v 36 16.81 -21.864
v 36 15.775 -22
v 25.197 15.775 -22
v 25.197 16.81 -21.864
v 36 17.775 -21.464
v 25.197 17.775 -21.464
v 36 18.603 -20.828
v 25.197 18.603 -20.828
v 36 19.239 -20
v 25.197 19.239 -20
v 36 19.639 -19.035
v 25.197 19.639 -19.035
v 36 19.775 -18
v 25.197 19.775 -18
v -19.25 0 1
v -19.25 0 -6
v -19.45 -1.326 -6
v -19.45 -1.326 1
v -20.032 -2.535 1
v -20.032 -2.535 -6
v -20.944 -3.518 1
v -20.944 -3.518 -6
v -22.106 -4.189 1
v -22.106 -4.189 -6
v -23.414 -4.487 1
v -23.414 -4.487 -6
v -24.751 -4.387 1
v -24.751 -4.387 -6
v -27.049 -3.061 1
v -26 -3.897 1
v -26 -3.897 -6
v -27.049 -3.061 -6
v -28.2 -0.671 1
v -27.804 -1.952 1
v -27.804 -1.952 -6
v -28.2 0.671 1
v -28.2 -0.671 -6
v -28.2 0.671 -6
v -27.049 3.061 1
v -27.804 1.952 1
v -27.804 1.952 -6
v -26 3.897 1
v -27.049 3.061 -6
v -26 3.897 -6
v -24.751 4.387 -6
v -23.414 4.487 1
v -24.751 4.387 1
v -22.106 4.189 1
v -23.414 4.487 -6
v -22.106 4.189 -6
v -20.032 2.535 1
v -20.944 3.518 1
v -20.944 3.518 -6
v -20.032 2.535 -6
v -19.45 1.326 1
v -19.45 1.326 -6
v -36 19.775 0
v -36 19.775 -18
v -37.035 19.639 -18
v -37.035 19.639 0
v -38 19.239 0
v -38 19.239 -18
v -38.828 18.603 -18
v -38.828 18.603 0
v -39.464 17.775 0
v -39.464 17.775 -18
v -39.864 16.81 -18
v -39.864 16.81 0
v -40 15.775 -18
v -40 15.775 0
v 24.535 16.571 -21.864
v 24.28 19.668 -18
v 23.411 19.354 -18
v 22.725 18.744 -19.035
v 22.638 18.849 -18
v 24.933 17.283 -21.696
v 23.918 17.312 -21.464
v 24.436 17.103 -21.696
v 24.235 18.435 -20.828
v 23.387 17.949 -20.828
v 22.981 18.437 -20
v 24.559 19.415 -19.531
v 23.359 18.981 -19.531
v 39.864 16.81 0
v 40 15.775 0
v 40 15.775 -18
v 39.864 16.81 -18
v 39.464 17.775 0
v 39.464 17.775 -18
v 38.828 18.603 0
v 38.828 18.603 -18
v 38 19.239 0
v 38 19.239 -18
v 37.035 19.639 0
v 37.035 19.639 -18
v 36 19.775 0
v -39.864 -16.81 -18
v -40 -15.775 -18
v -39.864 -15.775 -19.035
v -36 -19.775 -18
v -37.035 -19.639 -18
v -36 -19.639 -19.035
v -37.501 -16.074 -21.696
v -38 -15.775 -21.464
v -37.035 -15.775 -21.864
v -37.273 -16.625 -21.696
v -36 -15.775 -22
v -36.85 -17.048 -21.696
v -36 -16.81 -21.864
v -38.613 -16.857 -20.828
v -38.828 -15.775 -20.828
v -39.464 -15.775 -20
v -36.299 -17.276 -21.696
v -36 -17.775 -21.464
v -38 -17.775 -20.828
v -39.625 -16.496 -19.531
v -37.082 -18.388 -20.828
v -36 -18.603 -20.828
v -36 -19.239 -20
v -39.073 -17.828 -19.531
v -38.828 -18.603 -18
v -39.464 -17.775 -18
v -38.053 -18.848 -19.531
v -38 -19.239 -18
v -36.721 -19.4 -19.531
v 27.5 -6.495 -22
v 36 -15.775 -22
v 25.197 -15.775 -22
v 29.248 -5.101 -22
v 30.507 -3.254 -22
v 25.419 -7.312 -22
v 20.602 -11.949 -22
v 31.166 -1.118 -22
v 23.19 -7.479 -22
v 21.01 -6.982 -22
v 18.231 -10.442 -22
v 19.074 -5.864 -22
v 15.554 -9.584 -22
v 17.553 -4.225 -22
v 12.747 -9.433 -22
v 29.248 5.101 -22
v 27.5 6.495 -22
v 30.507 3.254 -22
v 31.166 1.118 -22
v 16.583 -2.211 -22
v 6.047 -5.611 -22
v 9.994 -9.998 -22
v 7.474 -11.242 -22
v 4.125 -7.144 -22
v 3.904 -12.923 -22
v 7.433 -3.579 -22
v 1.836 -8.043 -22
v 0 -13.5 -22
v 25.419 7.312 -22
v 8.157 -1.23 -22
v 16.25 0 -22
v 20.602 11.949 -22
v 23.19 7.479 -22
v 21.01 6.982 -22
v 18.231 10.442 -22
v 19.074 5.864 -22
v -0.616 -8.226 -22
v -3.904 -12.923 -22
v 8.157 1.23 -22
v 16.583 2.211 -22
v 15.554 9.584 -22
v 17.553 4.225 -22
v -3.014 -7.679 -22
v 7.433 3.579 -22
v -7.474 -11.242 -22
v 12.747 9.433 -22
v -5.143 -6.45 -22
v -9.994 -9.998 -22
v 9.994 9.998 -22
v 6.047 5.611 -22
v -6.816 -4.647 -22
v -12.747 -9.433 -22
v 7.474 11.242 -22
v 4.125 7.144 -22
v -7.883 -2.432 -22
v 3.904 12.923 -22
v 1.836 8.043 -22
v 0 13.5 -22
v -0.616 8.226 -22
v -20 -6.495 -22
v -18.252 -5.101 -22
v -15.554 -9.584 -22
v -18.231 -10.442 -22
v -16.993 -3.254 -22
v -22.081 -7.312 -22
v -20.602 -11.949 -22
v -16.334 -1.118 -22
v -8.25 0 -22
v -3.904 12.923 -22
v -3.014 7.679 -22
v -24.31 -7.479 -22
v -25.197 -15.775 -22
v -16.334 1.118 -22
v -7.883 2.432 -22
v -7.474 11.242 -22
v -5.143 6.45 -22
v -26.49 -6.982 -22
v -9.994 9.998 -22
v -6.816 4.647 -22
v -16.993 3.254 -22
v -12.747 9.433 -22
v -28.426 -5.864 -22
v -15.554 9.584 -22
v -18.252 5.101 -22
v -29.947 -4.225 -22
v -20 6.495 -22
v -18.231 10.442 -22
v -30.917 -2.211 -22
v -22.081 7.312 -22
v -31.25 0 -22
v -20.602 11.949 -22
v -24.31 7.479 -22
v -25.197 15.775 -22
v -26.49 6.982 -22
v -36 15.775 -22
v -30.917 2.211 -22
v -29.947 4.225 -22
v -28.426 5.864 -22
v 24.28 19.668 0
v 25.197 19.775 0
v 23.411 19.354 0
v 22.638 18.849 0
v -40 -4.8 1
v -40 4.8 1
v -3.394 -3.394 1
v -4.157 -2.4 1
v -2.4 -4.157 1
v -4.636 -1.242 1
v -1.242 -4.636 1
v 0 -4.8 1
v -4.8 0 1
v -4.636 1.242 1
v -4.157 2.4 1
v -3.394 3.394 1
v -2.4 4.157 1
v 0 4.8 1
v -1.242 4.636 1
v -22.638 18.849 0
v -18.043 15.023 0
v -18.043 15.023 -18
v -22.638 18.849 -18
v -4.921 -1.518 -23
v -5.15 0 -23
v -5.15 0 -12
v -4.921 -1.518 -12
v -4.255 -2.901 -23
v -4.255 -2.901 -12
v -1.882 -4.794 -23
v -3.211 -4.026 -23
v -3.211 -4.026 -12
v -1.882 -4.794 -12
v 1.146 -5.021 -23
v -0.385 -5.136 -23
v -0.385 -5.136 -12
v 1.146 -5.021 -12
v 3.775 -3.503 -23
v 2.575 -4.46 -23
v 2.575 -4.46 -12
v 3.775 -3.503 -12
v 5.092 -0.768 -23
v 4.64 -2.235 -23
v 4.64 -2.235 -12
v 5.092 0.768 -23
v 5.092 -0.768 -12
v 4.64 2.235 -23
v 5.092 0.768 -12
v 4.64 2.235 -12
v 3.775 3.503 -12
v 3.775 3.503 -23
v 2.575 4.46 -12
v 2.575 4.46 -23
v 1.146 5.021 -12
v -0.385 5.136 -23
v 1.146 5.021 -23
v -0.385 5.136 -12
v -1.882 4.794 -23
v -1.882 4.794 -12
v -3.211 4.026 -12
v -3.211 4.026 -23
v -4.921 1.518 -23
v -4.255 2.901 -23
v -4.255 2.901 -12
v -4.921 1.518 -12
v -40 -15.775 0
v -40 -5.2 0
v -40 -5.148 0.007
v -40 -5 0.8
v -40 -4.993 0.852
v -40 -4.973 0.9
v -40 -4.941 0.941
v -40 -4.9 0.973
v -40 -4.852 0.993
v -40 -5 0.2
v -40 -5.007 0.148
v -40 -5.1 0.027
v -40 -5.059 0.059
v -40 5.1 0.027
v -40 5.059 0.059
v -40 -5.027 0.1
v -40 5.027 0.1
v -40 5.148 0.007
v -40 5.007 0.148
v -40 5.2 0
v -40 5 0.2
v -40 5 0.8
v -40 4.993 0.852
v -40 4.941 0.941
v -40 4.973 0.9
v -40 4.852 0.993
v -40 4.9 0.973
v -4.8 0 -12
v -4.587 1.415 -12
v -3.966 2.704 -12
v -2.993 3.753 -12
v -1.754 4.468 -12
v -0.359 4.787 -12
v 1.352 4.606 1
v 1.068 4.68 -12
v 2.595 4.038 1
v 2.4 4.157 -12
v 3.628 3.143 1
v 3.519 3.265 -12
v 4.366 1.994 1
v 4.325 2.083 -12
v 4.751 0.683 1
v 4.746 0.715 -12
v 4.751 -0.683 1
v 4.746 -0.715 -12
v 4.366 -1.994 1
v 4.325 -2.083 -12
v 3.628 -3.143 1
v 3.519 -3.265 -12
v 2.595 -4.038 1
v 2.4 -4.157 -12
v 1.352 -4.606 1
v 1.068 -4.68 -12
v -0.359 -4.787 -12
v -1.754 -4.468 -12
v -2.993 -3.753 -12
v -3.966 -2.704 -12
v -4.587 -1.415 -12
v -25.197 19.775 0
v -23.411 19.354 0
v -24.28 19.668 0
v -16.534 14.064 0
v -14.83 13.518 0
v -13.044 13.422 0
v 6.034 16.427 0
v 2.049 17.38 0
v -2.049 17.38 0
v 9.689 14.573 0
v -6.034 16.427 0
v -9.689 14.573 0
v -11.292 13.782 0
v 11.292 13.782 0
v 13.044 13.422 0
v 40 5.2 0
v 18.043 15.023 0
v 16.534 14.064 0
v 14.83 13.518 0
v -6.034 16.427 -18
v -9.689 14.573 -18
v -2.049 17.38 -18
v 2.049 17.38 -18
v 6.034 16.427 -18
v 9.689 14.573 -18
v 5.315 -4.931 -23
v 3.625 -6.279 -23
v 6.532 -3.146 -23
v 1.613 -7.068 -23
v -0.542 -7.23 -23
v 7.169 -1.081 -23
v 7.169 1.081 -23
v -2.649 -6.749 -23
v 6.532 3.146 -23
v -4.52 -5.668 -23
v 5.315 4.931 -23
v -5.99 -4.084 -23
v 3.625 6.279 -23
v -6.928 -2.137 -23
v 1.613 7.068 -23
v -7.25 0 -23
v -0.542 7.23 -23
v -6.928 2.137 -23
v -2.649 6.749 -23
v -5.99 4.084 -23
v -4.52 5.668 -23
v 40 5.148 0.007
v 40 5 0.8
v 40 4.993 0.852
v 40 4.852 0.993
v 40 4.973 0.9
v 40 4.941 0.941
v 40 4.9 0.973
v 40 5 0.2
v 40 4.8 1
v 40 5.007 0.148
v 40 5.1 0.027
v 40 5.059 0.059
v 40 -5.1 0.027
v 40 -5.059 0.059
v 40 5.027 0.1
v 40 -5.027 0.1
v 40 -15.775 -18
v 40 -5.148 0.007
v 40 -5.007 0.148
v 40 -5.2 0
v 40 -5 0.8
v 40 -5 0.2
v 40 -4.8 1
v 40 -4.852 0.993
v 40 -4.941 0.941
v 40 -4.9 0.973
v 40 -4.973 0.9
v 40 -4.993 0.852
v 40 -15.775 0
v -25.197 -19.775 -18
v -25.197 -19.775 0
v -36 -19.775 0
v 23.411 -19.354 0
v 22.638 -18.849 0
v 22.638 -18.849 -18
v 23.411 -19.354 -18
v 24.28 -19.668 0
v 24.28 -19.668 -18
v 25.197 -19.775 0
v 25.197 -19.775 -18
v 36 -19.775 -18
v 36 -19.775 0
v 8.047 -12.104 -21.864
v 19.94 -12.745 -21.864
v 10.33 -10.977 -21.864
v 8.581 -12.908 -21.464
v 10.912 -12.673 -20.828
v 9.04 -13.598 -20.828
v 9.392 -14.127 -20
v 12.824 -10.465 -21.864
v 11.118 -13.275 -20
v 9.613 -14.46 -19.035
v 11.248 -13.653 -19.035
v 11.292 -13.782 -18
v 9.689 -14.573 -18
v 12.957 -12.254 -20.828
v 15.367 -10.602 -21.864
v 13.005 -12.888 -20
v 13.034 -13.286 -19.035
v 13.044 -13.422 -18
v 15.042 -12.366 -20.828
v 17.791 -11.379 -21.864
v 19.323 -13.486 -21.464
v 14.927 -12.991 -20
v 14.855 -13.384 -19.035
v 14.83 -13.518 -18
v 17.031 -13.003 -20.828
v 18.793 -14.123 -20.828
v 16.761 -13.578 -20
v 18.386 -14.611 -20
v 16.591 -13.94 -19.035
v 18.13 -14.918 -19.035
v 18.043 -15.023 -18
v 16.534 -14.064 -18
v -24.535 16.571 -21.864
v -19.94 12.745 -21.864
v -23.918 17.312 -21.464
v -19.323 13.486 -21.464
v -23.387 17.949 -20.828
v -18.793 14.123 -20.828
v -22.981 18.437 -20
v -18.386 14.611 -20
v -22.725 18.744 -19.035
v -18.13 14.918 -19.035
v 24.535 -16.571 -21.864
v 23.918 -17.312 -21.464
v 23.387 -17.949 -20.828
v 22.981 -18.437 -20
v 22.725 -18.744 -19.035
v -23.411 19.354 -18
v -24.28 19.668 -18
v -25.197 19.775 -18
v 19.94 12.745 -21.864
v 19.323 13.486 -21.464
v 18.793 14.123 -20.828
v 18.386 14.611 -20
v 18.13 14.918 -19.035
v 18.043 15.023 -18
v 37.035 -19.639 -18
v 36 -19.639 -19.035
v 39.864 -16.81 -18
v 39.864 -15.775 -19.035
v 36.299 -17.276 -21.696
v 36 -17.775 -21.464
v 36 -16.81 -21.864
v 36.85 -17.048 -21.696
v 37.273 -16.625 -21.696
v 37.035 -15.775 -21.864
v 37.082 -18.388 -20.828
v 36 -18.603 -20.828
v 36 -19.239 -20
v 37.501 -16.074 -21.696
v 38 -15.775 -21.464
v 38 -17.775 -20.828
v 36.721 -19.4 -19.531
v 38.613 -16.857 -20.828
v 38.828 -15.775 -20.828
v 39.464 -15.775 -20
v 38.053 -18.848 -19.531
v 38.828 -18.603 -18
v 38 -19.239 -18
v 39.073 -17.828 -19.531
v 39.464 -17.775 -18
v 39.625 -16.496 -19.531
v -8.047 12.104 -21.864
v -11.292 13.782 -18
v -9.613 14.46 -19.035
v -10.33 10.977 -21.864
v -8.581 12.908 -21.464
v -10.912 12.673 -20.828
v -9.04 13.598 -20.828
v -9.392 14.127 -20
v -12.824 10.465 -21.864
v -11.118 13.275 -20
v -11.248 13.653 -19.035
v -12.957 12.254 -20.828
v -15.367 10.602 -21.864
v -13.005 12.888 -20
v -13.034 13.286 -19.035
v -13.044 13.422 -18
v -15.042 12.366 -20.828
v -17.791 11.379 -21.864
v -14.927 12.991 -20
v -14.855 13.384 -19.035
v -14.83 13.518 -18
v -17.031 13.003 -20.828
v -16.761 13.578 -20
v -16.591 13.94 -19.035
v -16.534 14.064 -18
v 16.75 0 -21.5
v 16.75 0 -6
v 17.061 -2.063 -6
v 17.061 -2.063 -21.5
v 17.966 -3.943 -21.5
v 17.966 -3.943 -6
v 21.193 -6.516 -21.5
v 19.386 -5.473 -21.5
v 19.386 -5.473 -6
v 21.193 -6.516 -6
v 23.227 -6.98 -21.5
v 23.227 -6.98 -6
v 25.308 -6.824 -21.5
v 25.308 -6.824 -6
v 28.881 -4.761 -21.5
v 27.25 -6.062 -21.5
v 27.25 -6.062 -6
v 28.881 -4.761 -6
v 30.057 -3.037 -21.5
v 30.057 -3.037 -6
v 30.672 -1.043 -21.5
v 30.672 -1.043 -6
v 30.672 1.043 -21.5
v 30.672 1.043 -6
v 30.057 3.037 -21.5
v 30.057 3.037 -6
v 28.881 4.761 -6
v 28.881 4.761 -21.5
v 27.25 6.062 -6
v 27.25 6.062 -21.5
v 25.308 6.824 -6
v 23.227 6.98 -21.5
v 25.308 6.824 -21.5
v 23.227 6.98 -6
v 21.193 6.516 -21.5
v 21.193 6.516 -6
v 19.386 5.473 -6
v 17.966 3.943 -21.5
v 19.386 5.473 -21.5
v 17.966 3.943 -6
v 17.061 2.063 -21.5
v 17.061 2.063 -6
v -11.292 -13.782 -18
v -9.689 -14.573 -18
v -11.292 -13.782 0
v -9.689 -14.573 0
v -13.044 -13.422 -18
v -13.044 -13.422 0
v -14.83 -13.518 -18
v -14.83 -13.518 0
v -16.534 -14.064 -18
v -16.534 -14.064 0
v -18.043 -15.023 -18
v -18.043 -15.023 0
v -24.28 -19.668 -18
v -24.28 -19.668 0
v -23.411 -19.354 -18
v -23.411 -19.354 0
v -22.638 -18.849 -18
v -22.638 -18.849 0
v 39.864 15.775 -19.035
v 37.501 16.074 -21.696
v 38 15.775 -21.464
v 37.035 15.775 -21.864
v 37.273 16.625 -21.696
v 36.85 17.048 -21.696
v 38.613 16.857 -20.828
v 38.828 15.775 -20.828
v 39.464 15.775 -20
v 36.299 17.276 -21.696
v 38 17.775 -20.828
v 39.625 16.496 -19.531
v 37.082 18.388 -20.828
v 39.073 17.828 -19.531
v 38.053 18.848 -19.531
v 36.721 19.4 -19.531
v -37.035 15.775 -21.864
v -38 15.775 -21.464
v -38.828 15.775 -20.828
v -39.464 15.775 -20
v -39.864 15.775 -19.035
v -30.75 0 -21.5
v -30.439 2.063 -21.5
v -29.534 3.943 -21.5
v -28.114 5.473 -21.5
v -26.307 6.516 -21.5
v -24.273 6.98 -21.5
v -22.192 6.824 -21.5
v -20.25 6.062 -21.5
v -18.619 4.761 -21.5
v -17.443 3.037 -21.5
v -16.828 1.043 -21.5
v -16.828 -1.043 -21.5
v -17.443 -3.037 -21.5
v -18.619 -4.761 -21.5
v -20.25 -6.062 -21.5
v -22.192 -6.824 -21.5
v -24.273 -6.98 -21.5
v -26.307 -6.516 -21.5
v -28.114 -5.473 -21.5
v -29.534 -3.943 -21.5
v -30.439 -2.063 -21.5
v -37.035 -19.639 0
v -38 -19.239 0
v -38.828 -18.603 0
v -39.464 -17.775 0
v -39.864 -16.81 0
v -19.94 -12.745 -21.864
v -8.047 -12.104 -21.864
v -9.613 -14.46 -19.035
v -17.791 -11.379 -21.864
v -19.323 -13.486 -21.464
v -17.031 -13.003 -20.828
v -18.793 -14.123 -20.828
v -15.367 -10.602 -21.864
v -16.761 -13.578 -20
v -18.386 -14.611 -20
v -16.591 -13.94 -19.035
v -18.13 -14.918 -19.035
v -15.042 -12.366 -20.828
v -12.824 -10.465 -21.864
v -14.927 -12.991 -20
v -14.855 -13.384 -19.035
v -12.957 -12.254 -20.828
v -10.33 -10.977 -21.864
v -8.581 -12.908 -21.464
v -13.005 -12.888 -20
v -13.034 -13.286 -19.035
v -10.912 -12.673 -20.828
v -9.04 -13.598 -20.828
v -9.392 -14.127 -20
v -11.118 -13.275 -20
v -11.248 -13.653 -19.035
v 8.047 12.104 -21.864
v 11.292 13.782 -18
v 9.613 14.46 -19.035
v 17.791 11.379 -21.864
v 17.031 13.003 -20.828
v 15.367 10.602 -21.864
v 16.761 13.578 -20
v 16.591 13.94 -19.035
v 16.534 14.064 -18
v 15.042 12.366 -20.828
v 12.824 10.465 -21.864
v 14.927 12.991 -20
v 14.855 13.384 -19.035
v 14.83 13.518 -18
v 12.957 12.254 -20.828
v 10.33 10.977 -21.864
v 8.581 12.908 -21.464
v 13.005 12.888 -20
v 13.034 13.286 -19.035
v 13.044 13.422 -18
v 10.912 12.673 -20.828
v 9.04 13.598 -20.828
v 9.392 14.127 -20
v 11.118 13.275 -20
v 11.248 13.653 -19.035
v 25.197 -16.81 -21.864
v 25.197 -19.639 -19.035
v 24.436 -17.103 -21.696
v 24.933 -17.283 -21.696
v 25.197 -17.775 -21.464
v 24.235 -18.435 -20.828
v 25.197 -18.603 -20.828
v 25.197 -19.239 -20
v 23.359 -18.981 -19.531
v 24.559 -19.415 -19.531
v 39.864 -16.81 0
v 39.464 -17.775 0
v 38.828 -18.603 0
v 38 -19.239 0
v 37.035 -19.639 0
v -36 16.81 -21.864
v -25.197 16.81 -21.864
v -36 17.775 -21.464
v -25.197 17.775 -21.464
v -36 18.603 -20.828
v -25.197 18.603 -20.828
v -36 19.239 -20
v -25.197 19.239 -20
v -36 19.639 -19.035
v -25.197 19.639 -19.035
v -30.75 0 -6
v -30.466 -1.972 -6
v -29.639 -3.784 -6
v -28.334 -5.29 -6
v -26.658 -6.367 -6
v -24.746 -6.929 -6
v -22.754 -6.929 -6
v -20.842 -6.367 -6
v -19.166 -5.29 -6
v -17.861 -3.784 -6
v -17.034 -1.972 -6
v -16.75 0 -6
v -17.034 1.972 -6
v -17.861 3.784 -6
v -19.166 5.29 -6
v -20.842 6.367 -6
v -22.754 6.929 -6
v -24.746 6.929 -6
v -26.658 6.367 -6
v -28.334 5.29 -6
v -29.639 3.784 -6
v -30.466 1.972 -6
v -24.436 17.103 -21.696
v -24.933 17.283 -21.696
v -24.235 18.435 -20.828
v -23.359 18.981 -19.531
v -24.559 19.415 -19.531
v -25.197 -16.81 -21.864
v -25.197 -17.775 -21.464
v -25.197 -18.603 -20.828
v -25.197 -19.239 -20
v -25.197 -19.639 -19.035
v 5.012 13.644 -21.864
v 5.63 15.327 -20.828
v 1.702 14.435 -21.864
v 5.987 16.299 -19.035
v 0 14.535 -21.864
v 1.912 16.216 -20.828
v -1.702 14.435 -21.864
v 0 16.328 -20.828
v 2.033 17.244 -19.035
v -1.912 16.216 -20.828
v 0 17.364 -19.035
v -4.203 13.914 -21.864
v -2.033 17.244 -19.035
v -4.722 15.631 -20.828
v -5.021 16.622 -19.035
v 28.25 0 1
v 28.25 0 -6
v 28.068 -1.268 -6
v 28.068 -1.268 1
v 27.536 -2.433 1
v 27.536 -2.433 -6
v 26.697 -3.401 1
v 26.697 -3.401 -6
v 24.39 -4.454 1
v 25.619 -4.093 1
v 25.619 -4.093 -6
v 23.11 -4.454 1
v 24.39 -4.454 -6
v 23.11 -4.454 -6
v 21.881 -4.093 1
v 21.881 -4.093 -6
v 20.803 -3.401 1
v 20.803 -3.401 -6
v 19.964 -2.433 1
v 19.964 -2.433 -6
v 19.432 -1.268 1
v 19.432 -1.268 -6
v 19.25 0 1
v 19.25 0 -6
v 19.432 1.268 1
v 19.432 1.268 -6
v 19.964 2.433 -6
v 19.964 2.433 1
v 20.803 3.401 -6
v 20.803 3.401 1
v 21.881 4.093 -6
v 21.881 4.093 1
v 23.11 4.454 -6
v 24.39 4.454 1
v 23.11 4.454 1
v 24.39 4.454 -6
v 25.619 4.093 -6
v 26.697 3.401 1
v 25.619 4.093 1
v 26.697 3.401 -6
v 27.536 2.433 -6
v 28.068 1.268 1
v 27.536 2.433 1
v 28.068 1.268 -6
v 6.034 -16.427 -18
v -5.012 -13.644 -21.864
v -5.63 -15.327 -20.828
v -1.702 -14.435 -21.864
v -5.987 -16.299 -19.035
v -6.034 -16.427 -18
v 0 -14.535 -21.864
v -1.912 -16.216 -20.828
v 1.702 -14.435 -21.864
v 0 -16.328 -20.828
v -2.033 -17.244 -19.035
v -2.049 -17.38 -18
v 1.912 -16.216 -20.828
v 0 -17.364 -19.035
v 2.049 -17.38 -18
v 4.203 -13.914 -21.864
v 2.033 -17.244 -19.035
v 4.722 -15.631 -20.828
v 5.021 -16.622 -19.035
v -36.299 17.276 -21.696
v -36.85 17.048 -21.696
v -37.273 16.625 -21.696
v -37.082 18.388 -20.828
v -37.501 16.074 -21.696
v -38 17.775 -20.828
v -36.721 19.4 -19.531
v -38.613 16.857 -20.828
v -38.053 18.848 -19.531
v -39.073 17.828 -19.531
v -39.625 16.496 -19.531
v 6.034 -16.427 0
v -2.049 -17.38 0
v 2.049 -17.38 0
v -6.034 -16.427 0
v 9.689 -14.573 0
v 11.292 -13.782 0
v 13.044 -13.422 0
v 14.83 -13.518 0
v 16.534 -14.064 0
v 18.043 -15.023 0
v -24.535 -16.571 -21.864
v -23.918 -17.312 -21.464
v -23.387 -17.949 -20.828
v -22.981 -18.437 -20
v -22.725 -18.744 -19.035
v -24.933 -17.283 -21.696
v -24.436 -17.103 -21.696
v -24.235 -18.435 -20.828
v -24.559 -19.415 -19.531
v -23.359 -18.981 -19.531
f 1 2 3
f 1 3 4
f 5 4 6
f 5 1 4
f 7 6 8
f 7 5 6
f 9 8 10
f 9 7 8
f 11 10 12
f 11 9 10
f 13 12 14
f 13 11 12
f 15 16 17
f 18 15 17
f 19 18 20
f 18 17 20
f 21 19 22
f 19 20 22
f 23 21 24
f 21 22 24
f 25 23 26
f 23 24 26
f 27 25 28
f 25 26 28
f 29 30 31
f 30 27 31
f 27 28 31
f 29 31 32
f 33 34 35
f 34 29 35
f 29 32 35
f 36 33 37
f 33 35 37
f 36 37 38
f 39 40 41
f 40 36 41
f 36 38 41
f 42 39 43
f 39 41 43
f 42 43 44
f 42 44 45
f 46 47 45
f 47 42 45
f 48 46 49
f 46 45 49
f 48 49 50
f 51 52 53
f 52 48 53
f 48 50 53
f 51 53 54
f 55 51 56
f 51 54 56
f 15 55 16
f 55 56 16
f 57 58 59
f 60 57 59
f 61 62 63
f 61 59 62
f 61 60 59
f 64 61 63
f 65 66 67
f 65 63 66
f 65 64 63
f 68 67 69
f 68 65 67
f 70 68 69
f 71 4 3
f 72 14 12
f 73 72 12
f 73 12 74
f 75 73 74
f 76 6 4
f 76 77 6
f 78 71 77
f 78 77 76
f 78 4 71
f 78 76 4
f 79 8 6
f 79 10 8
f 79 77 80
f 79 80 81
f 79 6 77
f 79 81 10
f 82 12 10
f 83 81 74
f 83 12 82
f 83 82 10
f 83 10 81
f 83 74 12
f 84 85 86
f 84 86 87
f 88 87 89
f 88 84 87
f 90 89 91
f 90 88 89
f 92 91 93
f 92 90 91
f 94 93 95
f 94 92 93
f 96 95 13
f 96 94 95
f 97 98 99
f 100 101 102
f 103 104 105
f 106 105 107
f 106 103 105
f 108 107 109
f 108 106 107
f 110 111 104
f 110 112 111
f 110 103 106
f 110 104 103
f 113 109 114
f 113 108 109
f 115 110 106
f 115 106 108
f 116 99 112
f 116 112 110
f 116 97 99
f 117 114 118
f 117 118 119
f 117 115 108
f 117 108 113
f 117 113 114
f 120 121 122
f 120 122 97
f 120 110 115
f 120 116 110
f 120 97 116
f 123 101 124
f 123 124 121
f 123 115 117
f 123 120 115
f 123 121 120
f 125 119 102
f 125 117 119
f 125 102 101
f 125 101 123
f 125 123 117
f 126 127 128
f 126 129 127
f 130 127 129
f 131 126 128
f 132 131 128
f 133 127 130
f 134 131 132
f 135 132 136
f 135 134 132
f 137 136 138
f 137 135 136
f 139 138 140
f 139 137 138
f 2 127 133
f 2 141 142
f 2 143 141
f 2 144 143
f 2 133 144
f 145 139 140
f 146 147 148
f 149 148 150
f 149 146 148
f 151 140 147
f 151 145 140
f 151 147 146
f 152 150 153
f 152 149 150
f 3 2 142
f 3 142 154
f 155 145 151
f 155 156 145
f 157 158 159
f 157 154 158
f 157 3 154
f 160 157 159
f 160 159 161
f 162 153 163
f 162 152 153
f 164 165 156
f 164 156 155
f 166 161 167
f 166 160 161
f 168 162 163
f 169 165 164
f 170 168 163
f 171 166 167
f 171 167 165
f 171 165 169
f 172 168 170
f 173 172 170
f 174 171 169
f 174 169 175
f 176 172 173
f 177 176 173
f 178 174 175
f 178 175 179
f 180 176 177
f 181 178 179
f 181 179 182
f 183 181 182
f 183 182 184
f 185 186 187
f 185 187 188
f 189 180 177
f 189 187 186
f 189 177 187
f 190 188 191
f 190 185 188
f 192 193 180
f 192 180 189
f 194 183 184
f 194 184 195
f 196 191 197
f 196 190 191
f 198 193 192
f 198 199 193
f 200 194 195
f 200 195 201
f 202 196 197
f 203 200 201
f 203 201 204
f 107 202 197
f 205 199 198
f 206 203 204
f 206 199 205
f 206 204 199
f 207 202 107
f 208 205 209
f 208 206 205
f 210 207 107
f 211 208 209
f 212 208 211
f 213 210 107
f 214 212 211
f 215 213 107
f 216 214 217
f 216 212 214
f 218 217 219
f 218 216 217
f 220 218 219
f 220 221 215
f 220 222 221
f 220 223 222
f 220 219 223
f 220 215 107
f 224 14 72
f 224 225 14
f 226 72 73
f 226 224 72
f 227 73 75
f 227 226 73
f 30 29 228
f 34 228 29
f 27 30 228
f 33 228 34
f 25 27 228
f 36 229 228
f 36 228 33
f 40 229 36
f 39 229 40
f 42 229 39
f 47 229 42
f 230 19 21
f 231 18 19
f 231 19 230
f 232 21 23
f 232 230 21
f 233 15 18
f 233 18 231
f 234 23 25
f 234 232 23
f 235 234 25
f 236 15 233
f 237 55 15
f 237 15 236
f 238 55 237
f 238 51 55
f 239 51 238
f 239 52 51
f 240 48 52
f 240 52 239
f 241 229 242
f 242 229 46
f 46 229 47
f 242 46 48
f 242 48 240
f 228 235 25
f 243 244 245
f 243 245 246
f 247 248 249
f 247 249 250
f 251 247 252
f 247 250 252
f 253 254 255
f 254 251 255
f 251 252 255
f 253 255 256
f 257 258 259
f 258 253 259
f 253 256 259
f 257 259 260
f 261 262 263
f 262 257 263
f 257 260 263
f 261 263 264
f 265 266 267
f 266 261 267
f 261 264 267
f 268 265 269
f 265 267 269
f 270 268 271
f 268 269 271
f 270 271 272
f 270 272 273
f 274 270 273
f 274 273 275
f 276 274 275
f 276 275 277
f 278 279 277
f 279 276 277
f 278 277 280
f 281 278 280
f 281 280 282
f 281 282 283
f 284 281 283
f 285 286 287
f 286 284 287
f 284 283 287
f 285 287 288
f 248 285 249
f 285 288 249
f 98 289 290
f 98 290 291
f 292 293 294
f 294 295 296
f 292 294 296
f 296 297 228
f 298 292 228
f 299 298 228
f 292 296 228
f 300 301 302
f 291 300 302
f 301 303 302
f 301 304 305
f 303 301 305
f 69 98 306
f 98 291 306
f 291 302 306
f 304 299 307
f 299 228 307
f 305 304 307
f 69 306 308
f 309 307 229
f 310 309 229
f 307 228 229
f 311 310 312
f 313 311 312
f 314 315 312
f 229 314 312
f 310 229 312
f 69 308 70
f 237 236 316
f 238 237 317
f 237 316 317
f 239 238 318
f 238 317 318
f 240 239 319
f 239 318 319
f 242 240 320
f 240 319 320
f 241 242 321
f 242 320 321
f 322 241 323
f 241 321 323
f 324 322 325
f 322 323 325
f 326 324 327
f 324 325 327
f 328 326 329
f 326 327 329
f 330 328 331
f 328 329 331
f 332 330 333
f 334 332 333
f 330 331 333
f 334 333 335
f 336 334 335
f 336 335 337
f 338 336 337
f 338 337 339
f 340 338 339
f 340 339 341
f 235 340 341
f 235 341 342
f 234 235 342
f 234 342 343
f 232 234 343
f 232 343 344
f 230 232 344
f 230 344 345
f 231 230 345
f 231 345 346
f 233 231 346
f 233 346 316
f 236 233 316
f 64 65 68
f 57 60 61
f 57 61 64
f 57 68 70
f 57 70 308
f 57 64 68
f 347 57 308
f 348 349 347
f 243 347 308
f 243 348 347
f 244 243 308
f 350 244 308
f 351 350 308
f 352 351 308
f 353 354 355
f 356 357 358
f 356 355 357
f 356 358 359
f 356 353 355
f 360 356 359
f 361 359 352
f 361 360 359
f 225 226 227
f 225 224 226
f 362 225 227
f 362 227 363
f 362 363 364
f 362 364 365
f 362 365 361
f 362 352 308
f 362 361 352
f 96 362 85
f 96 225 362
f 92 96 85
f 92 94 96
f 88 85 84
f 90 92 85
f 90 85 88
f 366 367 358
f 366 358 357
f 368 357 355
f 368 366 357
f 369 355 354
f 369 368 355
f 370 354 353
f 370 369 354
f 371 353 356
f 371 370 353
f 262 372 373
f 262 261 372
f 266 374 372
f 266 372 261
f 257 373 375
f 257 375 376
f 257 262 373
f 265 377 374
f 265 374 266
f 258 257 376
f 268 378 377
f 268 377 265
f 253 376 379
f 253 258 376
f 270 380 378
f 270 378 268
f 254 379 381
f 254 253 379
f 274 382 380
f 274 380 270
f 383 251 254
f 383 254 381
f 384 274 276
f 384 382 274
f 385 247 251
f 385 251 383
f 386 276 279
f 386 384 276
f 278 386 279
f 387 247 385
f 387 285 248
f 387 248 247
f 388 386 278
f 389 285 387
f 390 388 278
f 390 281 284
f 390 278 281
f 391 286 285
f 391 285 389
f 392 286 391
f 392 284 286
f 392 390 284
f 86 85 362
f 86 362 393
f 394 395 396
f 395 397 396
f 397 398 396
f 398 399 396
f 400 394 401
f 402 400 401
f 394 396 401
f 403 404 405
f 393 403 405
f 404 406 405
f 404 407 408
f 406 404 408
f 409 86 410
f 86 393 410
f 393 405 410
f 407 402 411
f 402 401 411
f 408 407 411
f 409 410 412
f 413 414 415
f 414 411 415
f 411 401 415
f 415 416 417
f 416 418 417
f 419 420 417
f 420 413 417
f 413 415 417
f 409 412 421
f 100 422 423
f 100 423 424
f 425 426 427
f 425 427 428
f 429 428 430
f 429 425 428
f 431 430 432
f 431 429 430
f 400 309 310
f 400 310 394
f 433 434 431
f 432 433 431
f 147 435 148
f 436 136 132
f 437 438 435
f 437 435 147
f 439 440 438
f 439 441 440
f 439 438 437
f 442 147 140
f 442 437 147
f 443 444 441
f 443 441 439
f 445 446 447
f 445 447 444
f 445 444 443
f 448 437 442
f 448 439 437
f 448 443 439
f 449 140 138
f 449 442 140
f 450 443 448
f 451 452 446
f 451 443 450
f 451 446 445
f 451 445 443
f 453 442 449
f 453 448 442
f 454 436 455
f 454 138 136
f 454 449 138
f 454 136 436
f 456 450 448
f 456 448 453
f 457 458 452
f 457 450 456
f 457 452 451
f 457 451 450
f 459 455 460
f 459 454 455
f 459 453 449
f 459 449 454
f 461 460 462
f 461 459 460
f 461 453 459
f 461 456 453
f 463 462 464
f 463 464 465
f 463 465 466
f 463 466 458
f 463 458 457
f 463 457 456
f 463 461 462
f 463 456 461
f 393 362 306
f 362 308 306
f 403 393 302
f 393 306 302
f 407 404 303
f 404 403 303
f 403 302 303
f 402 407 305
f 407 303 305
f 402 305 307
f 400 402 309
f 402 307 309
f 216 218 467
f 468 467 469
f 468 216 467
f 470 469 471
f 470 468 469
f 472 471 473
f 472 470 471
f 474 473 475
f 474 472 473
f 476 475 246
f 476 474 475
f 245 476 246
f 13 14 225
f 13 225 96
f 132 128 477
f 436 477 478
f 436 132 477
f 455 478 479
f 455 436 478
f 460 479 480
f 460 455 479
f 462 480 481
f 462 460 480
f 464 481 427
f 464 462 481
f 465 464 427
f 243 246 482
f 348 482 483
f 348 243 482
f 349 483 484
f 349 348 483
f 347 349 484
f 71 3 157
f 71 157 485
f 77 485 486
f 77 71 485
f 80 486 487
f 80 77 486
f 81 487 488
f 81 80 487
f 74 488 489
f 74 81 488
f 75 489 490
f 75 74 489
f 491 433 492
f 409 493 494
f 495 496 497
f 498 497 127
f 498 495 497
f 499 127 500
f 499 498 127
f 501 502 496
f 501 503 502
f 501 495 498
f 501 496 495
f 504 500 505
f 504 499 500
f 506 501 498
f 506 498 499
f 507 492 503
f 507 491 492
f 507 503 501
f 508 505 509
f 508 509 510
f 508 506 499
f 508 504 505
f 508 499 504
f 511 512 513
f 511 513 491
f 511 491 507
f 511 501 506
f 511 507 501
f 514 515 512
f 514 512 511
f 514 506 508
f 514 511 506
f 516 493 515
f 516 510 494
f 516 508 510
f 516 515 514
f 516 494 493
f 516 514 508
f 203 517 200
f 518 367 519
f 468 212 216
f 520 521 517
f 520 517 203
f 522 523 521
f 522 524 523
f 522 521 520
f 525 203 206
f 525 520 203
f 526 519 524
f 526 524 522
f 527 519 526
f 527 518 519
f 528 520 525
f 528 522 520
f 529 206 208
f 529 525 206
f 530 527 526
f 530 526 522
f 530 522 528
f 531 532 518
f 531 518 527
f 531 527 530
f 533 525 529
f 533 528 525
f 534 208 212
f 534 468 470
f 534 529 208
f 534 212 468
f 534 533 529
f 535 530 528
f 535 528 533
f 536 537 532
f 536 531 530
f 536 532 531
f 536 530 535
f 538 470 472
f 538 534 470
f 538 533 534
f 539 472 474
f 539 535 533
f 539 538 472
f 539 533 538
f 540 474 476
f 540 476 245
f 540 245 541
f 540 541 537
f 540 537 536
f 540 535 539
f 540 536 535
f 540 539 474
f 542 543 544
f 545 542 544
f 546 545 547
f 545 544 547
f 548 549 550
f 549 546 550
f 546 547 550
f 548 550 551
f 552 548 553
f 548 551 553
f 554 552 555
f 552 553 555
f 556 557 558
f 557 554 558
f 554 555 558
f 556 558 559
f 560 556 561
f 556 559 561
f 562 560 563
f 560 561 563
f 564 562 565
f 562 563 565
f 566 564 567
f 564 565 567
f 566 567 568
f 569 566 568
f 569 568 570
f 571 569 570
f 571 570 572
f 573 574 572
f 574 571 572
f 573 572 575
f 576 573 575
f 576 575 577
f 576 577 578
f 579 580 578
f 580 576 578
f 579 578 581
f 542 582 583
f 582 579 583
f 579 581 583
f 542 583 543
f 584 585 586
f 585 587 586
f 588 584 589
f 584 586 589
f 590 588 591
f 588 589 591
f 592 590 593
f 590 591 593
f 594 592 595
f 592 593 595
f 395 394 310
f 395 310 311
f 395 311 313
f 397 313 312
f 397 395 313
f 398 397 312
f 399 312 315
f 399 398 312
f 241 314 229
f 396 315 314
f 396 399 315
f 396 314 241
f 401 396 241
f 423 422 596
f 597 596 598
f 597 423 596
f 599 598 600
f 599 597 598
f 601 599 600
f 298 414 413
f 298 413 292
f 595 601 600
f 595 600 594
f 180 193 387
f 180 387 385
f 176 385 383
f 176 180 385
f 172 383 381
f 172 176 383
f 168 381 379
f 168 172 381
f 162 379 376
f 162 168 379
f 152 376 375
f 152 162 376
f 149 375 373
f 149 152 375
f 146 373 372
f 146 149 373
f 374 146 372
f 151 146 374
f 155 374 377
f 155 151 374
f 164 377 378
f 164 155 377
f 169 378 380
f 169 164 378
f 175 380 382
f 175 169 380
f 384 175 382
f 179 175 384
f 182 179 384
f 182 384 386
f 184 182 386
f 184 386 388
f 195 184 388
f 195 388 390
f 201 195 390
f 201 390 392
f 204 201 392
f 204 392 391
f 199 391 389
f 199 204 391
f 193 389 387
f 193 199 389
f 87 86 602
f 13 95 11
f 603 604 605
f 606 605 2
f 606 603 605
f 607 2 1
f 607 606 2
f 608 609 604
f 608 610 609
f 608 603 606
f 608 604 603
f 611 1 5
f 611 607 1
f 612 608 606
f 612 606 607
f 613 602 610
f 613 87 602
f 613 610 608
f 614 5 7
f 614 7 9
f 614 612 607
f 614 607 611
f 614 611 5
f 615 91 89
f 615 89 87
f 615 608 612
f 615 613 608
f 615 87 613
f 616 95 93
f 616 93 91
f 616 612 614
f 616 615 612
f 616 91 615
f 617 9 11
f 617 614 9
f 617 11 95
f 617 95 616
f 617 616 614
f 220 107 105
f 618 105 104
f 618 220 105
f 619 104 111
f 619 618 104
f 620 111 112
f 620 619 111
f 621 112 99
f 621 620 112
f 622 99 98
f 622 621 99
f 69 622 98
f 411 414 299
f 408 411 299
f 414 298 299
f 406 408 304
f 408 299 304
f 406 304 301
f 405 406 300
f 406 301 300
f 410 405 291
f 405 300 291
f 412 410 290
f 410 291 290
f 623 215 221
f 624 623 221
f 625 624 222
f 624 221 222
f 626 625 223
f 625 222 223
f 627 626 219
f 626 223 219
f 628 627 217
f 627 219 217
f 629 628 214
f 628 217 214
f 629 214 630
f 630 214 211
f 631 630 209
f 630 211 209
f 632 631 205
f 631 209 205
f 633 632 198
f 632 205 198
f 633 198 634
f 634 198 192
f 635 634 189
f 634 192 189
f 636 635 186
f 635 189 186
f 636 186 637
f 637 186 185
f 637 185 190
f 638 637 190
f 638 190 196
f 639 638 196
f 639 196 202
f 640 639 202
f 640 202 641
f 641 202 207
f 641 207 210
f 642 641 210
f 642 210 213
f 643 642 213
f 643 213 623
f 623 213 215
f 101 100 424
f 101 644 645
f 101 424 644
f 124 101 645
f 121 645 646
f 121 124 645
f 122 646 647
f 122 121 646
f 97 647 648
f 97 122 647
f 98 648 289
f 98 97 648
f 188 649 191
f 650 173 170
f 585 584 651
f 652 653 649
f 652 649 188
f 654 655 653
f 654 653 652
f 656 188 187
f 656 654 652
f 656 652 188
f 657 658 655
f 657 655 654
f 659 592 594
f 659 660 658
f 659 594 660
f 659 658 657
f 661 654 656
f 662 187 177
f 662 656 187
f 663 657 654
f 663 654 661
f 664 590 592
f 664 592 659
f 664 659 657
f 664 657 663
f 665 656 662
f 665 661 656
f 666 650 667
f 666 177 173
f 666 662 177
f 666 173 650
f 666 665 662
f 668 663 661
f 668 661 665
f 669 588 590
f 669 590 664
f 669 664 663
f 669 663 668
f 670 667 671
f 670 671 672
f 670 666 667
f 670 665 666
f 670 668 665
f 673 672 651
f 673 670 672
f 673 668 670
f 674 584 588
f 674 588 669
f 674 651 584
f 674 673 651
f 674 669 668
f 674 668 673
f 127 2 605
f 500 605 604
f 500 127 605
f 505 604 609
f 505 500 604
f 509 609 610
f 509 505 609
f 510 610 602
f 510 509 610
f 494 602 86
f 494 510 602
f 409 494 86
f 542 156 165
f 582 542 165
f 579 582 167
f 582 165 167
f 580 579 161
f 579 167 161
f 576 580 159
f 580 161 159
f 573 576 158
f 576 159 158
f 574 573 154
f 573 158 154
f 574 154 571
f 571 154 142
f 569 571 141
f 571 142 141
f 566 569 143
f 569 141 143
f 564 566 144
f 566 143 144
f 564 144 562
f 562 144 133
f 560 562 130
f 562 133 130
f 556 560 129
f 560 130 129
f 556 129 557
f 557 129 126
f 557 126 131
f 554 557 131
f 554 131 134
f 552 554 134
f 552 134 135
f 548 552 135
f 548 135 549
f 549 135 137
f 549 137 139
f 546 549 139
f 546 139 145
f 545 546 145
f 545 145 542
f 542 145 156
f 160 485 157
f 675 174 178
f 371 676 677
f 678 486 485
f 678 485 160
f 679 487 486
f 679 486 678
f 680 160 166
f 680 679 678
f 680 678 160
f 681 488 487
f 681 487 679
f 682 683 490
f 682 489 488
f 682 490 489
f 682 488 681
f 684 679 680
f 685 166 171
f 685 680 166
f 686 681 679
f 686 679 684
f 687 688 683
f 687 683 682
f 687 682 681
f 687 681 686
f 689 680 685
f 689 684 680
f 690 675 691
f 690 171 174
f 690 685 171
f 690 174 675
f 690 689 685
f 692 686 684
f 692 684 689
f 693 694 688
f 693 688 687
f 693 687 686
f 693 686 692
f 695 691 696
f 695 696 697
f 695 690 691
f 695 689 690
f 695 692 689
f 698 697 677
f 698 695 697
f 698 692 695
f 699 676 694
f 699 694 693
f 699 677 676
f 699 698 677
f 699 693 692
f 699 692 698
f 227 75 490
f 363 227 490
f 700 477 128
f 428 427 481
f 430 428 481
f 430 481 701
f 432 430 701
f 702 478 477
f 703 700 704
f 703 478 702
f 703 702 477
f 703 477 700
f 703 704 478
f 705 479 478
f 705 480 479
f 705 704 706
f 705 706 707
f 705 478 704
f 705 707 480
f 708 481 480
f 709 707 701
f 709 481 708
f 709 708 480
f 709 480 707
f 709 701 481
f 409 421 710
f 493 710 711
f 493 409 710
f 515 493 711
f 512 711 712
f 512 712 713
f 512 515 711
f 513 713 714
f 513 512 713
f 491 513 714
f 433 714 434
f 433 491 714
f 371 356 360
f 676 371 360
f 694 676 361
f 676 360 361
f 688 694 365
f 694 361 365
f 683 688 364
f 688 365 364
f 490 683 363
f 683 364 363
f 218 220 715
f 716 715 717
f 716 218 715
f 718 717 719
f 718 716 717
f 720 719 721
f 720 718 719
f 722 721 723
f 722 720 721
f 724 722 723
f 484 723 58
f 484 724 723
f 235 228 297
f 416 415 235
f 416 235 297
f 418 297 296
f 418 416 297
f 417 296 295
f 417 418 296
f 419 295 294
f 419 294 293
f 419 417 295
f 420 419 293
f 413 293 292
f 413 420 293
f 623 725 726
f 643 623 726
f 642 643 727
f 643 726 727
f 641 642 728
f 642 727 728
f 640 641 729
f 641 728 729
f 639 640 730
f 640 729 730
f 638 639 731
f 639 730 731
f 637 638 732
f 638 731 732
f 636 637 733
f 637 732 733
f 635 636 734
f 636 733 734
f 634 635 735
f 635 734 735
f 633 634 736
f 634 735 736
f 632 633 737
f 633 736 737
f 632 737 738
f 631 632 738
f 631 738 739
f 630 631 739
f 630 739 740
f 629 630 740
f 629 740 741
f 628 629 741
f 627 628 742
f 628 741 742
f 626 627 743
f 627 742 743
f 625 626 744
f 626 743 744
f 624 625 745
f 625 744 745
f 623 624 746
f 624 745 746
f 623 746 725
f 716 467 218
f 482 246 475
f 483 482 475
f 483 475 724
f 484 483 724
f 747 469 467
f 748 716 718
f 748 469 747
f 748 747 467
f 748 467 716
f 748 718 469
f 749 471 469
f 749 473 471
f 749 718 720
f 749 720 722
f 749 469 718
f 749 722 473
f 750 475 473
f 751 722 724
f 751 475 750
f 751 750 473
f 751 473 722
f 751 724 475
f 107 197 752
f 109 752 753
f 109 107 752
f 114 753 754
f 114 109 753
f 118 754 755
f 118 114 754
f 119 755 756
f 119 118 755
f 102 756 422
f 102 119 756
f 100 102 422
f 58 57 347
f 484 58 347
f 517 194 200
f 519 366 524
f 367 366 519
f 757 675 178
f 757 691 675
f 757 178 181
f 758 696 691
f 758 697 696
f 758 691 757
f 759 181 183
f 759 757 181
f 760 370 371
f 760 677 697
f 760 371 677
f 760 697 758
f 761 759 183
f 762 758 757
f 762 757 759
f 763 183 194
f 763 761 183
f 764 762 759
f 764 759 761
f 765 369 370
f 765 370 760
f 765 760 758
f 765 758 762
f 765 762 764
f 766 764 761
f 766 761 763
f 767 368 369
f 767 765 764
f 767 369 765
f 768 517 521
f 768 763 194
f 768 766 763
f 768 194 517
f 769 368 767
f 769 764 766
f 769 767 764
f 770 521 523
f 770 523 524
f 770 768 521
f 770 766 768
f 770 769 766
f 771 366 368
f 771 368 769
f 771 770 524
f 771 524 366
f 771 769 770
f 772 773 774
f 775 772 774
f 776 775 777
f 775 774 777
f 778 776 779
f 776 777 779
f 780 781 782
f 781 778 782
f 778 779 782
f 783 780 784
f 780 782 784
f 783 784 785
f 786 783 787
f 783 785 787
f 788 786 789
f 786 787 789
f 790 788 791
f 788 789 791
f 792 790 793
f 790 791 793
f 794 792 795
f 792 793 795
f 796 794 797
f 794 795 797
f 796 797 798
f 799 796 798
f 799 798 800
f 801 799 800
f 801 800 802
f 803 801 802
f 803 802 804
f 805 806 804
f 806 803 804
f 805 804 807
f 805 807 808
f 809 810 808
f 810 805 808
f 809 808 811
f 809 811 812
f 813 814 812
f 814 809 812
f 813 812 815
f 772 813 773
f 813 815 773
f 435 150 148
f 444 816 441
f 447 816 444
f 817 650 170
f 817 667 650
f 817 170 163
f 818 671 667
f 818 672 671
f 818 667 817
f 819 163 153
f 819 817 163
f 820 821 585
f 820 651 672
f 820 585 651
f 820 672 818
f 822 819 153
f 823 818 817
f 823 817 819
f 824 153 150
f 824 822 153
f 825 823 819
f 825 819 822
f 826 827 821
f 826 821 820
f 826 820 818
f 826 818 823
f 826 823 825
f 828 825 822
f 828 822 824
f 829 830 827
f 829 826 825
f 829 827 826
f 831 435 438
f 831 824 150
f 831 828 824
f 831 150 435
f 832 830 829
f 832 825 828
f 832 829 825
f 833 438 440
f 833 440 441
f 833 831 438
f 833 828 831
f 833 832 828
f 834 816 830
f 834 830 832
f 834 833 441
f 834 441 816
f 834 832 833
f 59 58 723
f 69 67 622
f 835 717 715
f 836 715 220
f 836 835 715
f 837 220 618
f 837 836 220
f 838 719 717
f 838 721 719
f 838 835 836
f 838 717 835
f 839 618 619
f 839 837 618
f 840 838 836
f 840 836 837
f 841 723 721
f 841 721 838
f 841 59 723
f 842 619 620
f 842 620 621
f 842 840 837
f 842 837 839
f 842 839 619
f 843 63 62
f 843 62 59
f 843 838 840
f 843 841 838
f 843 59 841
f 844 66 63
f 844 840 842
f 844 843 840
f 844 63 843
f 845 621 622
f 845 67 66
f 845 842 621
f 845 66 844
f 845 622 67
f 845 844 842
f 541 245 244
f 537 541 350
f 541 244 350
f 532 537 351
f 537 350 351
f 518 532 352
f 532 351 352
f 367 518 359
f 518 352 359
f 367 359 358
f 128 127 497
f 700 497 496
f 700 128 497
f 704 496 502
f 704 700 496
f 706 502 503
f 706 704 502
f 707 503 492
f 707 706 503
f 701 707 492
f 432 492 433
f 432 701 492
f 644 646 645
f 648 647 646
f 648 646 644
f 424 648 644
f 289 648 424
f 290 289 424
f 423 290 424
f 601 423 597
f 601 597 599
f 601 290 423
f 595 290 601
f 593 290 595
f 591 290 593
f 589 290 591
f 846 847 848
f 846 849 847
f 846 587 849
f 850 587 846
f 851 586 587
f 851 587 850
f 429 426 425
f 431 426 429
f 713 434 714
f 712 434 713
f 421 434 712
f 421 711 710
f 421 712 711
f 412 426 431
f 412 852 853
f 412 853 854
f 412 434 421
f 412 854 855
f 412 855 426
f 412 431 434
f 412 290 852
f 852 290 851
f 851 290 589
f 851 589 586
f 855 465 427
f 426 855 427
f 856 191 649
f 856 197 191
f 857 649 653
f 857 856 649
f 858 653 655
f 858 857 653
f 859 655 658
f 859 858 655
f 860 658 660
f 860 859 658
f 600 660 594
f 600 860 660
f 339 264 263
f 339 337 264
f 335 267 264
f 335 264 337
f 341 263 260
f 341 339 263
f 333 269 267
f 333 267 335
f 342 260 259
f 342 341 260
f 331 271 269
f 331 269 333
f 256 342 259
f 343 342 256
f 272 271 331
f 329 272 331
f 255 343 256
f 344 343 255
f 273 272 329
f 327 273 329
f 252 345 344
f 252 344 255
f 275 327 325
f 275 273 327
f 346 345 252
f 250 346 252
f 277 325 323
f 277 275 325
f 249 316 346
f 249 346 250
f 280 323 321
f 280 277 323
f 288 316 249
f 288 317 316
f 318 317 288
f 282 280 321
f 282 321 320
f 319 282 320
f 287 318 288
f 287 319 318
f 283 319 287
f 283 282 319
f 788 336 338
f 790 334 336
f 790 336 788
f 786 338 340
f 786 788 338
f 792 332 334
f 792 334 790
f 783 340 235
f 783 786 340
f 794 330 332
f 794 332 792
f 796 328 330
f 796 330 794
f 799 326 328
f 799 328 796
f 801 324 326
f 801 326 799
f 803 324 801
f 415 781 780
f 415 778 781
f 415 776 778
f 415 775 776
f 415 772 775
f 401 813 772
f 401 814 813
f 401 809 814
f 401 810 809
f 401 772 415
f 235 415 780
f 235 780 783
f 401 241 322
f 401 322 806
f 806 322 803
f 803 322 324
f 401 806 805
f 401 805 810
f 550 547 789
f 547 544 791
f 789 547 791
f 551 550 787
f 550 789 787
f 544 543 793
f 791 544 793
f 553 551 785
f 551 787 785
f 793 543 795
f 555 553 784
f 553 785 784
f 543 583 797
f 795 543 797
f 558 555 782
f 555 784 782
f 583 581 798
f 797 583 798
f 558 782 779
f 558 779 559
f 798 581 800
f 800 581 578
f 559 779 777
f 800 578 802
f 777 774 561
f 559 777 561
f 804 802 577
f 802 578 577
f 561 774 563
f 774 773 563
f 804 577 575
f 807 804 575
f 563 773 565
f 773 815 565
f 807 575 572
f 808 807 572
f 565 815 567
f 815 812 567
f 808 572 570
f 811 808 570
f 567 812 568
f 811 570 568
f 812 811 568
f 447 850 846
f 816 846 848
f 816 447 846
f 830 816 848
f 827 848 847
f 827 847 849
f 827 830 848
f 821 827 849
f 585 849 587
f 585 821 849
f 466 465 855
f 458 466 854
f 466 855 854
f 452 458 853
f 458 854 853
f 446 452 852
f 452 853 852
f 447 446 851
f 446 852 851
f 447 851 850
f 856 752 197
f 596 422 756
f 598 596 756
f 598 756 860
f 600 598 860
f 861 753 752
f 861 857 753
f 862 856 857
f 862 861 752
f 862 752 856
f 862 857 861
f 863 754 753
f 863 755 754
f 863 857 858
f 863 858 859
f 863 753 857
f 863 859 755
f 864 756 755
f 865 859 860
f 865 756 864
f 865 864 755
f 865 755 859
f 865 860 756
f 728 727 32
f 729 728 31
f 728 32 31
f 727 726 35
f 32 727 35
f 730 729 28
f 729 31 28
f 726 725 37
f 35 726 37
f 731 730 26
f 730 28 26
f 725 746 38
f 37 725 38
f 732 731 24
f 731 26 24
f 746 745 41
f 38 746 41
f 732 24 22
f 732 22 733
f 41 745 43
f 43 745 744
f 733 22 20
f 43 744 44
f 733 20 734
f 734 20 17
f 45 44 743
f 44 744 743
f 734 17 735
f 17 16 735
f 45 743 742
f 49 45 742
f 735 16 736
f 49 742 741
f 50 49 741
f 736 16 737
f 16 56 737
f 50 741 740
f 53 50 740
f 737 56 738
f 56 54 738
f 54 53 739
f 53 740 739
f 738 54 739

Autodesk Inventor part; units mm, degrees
ref_plane "YZ Plane" through (0, 0, 0) normal (1, 0, 0) x (0, 1, 0)
ref_plane "XZ Plane" through (0, 0, 0) normal (0, 1, 0) x (-1, 0, 0)
ref_plane "XY Plane" through (0, 0, 0) normal (0, 0, 1) x (1, 0, 0)
sketch "Sketch1" plane through (0, 0, 0) normal (0, 0, 1) x (1, 0, 0)
  line L0 (-40, 19.775) -> (40, 19.775)
  line L1 (40, 19.775) -> (40, -19.775)
  line L2 (40, -19.775) -> (-40, -19.775)
  line L3 (-40, -19.775) -> (-40, 19.775)
  line L4 (-40, 19.775) -> (40, -19.775) construction
  line L5 (40, 19.775) -> (-40, -19.775) construction
  line L6 (40, -5) -> (-40, -5)
  line L7 (-40, -5) -> (-40, 5)
  line L8 (-40, 5) -> (40, 5)
  line L9 (40, 5) -> (40, -5)
  line L10 (40, -5) -> (-40, 5) construction
  line L11 (-40, -5) -> (40, 5) construction
  line L12 (23.75, 0) -> (-23.75, 0)
  circle A0 centre (-23.75, 0) radius 4.5
  circle A1 centre (23.75, 0) radius 4.5
  circle A2 centre (0, 0) radius 8
  point P0 (40, 5)
  point P1 (-40, -5)
  point P2 (40, -5)
  point P3 (-6.245, -5)
  point P4 (6.245, -5)
  point P5 (6.245, 5)
  point P6 (-6.245, 5)
  dimension "d0" = 80
  dimension "d1" = 39.55
  dimension "d3" = 10
  dimension "d9" = 80
  dimension "d10" = 47.5
  dimension "d11" = 9
  dimension "d12" = 9
  dimension "d15" = 16
  dimension "d42" = 19.775
  dimension "d43" = 0
extrude "Extrusion1" add sketch "Sketch1" along normal blind 1 contours L8 A2 L6 L3 | L1 L6 A2 L8 | L8 A2 L12 | A2 L12 L6
extrude "Extrusion2" add sketch "Sketch1" against normal blind 6
fillet "Fillet1" radius 0.2 4 edges at (0, 5, 0) (0, 5, 1) (0, -5, 1) (0, -5, 0)
sketch "Sketch2" plane through (0, 0, -6) normal (0, 0, -1) x (-1, 0, 0)
  circle A0 centre (23.75, 0) radius 4.5 projected
  circle A1 centre (-23.75, 0) radius 4.5 projected
  circle A2 centre (23.75, 0) radius 7
  circle A3 centre (-23.75, 0) radius 7
  line L0 (-40, -19.775) -> (40, -19.775) projected
  line L1 (-40, 19.775) -> (-40, -19.775) projected
  line L2 (40, 19.775) -> (-40, 19.775) projected
  line L3 (40, -19.775) -> (40, 19.775) projected
  point P0 (0, 0)
  dimension "d16" = 14
  dimension "d17" = 14
extrude "Extrusion3" add sketch "Sketch2" along normal blind 16 contours L1 L2 L3 L0
sketch "Sketch3" plane through (0, 0, -22) normal (0, 0, -1) x (-1, 0, 0)
  circle A0 centre (0, 0) radius 5.15
  dimension "d21" = 10.3
extrude "Extrusion4" cut sketch "Sketch3" against normal blind 10
sketch "Sketch4" plane through (0, 0, -22) normal (0, 0, -1) x (-1, 0, 0)
  circle A0 centre (0, 0) radius 5.15 projected
  circle A1 centre (0, 0) radius 7.25
  dimension "d24" = 14.5
extrude "Extrusion5" add sketch "Sketch4" along normal blind 1
chamfer "Chamfer1" distance 1 distance2 1 1 edges at (7.25, 0, -22) measured on face at (-0.2913, -15.5824, -22)
sketch "Sketch5" plane through (0, 0, -12) normal (0, 0, -1) x (-1, 0, 0)
  circle A0 centre (0, 0) radius 4.8
  dimension "d30" = 9.6
extrude "Extrusion6" cut sketch "Sketch5" against normal blind 20
sketch "Sketch6" plane through (0, 0, -22) normal (0, 0, -1) x (-1, 0, 0)
  circle A0 centre (0, 0) radius 17.5
  circle A1 centre (23.75, 0) radius 7 projected
  circle A2 centre (-23.75, 0) radius 7 projected
  line L0 (40, -19.775) -> (40, 19.775) projected
  line L1 (40, 19.775) -> (-40, 19.775) projected
  line L2 (-40, 19.775) -> (-40, -19.775) projected
  line L3 (-40, -19.775) -> (40, -19.775) projected
  circle A3 centre (0, 0) radius 8.25 projected
  line L4 (-23.75, 0) -> (-23.75, 19.775)
  line L5 (13.4485, 11.1977) -> (23.75, 19.775)
  line L6 (-40, 19.775) -> (40, 19.775) projected
  line L7 (-23.75, 19.775) -> (-13.4485, 11.1977)
  dimension "d33" = 35
extrude "Extrusion7" cut sketch "Sketch6" against normal through all contours A0 L7 L1 L5
mirror "Mirror1" about plane through (0, 0, 0) normal (0, 1, 0) of "Extrusion7"
fillet "Fillet3" radius 7 4 edges at (13.4485, 11.1977, -11) (-13.4485, 11.1977, -11) (13.4485, -11.1977, -11) (-13.4485, -11.1977, -11)
fillet "Fillet4" radius 4 8 edges at (23.75, -19.775, -11) (40, -19.775, -11) (40, 19.775, -11) (23.75, 19.775, -11) (-23.75, 19.775, -11) (-40, 19.775, -11) (-40, -19.775, -11) (-23.75, -19.775, -11)
fillet "Fillet5" radius 4 24 edges at (38.8284, 18.6034, -22) (40, 0, -22) (38.8284, -18.6034, -22) (30.5986, -19.775, -22) (23.8363, -19.5364, -22) (20.3404, -16.9361, -22) (13.9404, -13.4128, -22) (0, -17.5, -22) (-13.9404, -13.4128, -22) (-20.3404, -16.9361, -22) (-23.8363, -19.5364, -22) (-30.5986, -19.775, -22) (-38.8284, -18.6034, -22) (-40, 0, -22) (-38.8284, 18.6034, -22) (-30.5986, 19.775, -22) (-23.8363, 19.5364, -22) (-20.3404, 16.9361, -22) (-13.9404, 13.4128, -22) (0, 17.5, -22) (13.9404, 13.4128, -22) (20.3404, 16.9361, -22) (23.8363, 19.5364, -22) (30.5986, 19.775, -22)
chamfer "Chamfer2" distance 0.5 angle 45 2 edges at (-16.75, 0, -22) (30.75, 0, -22)
equation "\"d9\" = d0"
properties part number "Base_Mount_Pedals"
